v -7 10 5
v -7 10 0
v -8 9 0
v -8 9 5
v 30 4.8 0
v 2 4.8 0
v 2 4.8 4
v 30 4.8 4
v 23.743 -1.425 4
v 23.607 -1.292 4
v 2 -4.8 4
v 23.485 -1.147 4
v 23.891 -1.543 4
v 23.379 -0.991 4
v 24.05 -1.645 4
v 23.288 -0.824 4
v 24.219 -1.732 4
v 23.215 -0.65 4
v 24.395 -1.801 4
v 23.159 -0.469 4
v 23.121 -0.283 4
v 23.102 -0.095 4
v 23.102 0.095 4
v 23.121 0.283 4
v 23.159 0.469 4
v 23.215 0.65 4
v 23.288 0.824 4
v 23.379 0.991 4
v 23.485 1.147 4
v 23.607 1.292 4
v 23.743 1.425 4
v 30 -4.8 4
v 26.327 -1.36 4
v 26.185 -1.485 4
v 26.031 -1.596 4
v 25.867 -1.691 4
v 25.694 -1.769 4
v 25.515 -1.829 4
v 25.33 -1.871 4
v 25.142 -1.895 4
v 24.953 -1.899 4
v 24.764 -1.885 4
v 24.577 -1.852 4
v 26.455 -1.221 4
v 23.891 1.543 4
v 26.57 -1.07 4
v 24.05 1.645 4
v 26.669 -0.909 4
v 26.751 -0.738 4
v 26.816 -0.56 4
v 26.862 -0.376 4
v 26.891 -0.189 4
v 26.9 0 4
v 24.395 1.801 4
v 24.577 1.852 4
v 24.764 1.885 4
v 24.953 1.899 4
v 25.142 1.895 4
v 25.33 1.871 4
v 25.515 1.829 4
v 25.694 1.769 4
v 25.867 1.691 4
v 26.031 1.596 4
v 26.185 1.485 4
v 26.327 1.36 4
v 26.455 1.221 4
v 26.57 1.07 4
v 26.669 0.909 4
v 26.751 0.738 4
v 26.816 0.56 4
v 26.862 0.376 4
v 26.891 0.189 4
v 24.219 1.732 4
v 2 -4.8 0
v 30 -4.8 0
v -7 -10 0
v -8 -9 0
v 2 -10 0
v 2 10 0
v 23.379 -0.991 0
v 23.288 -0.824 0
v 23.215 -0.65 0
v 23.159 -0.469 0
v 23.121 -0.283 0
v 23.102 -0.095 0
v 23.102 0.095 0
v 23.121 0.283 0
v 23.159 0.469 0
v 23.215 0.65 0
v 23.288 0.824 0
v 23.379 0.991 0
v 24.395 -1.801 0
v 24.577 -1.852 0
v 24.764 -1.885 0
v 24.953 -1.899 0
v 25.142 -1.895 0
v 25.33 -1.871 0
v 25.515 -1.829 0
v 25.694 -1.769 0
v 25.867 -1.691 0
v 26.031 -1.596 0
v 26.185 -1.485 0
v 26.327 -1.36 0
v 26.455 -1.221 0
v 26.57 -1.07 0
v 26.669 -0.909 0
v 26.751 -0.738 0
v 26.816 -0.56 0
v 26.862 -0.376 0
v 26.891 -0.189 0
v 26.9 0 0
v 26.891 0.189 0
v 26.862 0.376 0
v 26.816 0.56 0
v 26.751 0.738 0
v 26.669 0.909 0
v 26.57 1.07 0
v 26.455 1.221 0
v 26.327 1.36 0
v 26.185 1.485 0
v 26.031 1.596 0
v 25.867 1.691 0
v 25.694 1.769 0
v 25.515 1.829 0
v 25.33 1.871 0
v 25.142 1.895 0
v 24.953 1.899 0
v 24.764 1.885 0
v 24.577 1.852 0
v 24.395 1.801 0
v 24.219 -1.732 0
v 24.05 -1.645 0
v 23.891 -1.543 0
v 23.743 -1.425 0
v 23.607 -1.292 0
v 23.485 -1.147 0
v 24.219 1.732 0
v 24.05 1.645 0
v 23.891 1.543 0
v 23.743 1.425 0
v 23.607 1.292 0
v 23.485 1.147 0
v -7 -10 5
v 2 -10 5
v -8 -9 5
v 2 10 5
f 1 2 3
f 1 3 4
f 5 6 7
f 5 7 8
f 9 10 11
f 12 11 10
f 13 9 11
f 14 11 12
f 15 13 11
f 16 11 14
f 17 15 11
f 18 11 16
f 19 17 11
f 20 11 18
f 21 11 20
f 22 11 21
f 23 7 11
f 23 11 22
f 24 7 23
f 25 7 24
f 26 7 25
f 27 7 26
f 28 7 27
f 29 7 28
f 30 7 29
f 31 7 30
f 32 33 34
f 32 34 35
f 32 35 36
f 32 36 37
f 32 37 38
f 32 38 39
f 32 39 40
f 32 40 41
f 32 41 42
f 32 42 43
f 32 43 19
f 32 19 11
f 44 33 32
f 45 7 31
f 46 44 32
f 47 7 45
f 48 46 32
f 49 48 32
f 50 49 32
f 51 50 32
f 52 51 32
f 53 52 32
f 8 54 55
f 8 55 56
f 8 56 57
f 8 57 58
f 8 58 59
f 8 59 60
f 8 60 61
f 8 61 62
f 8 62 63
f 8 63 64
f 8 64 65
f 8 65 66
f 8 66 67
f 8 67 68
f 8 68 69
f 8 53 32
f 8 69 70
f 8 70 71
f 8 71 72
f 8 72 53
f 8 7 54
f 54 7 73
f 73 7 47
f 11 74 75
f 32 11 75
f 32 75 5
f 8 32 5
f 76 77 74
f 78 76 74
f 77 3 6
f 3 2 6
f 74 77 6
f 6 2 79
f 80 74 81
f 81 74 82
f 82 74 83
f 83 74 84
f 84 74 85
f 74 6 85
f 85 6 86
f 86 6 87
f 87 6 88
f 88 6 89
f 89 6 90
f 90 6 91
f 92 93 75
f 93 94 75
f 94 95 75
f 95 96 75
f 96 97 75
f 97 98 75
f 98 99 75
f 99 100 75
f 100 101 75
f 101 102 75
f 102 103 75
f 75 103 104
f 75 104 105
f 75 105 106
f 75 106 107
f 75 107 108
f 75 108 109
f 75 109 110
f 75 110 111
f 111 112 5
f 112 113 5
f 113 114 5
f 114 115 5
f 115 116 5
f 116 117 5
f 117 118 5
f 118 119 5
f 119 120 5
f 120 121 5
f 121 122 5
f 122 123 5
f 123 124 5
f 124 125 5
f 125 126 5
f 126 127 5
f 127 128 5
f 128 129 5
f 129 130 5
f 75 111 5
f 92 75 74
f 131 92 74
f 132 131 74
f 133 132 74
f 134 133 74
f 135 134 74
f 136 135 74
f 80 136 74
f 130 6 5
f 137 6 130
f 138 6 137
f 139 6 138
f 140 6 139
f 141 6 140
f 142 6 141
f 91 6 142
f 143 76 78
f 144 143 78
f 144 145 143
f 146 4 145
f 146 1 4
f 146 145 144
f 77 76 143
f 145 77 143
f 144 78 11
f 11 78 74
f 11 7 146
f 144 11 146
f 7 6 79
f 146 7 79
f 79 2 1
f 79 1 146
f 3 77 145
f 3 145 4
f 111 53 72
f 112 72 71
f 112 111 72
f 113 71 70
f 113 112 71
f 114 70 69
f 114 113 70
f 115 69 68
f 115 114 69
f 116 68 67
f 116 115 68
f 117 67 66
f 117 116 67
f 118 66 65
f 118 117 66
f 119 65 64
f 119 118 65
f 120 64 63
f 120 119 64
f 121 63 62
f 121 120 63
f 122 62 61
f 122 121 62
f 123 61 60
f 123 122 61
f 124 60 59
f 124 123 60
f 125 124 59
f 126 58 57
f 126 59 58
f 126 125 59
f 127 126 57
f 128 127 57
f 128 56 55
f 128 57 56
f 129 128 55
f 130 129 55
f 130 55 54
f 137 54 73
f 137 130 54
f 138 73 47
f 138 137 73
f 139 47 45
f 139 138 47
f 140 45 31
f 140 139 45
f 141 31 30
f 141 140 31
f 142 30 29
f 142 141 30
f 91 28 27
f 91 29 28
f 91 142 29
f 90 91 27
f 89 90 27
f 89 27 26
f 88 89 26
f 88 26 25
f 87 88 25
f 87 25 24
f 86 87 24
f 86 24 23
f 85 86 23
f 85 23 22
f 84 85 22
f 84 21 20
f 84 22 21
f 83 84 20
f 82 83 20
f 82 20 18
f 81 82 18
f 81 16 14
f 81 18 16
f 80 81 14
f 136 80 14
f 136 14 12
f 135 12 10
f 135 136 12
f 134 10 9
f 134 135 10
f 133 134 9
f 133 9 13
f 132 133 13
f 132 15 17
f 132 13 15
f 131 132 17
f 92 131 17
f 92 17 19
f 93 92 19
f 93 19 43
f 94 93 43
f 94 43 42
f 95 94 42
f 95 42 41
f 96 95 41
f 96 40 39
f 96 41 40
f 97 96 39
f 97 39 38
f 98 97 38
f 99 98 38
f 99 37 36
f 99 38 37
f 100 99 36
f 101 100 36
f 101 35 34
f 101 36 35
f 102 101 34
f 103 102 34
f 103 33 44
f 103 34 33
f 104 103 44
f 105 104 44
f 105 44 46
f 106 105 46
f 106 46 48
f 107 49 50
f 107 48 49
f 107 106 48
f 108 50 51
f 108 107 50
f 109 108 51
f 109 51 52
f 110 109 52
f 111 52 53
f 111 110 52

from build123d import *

# Parameters (mm, degrees)
CYLINDER025_R     = 1.9
CYLINDER025_DEPTH = 5
BOX018_W          = 30
BOX018_H          = 9.6
BOX018_DEPTH      = 4
BOX019_W          = 10
BOX019_H          = 20
BOX019_DEPTH      = 5
CHAMFER009_SIZE   = 1


with BuildPart() as cylinder025:
    # Cylinder025 → Cylinder025 (new body)
    with BuildSketch(Plane(origin=(25, 0, 0), x_dir=(1, 0, 0), z_dir=(0, 0, 1))):
        Circle(CYLINDER025_R)
    extrude(amount=CYLINDER025_DEPTH)


with BuildPart() as cut002008023012009006003002006_body:
    # Box018 → Box018 (new body)
    with BuildSketch(Plane(origin=(0, -4.8, 0), x_dir=(1, 0, 0), z_dir=(0, 0, 1))):
        with Locations((15, 4.8)):
            Rectangle(BOX018_W, BOX018_H)
    extrude(amount=BOX018_DEPTH)

    # Cut002008023012009006003002006002006002004004002: cut Cylinder025
    add(cylinder025.part, mode=Mode.SUBTRACT)


with BuildPart() as fusion001001001011002004:
    # Box019 → Box019 (new body)
    with BuildSketch(Plane(origin=(-8, -10, 0), x_dir=(1, 0, 0), z_dir=(0, 0, 1))):
        with Locations((5, 10)):
            Rectangle(BOX019_W, BOX019_H)
    extrude(amount=BOX019_DEPTH)

    # Chamfer009
    chamfer009_edges = [fusion001001001011002004.edges().sort_by_distance(p)[0] for p in [
        (-8, -10, 2.5),
        (-8, 10, 2.5),
    ]]
    chamfer(chamfer009_edges, length=CHAMFER009_SIZE)

    # Fusion001001001011002004: union Cut002008023012009006003002006 body
    add(cut002008023012009006003002006_body.part)


solid = fusion001001001011002004.part
